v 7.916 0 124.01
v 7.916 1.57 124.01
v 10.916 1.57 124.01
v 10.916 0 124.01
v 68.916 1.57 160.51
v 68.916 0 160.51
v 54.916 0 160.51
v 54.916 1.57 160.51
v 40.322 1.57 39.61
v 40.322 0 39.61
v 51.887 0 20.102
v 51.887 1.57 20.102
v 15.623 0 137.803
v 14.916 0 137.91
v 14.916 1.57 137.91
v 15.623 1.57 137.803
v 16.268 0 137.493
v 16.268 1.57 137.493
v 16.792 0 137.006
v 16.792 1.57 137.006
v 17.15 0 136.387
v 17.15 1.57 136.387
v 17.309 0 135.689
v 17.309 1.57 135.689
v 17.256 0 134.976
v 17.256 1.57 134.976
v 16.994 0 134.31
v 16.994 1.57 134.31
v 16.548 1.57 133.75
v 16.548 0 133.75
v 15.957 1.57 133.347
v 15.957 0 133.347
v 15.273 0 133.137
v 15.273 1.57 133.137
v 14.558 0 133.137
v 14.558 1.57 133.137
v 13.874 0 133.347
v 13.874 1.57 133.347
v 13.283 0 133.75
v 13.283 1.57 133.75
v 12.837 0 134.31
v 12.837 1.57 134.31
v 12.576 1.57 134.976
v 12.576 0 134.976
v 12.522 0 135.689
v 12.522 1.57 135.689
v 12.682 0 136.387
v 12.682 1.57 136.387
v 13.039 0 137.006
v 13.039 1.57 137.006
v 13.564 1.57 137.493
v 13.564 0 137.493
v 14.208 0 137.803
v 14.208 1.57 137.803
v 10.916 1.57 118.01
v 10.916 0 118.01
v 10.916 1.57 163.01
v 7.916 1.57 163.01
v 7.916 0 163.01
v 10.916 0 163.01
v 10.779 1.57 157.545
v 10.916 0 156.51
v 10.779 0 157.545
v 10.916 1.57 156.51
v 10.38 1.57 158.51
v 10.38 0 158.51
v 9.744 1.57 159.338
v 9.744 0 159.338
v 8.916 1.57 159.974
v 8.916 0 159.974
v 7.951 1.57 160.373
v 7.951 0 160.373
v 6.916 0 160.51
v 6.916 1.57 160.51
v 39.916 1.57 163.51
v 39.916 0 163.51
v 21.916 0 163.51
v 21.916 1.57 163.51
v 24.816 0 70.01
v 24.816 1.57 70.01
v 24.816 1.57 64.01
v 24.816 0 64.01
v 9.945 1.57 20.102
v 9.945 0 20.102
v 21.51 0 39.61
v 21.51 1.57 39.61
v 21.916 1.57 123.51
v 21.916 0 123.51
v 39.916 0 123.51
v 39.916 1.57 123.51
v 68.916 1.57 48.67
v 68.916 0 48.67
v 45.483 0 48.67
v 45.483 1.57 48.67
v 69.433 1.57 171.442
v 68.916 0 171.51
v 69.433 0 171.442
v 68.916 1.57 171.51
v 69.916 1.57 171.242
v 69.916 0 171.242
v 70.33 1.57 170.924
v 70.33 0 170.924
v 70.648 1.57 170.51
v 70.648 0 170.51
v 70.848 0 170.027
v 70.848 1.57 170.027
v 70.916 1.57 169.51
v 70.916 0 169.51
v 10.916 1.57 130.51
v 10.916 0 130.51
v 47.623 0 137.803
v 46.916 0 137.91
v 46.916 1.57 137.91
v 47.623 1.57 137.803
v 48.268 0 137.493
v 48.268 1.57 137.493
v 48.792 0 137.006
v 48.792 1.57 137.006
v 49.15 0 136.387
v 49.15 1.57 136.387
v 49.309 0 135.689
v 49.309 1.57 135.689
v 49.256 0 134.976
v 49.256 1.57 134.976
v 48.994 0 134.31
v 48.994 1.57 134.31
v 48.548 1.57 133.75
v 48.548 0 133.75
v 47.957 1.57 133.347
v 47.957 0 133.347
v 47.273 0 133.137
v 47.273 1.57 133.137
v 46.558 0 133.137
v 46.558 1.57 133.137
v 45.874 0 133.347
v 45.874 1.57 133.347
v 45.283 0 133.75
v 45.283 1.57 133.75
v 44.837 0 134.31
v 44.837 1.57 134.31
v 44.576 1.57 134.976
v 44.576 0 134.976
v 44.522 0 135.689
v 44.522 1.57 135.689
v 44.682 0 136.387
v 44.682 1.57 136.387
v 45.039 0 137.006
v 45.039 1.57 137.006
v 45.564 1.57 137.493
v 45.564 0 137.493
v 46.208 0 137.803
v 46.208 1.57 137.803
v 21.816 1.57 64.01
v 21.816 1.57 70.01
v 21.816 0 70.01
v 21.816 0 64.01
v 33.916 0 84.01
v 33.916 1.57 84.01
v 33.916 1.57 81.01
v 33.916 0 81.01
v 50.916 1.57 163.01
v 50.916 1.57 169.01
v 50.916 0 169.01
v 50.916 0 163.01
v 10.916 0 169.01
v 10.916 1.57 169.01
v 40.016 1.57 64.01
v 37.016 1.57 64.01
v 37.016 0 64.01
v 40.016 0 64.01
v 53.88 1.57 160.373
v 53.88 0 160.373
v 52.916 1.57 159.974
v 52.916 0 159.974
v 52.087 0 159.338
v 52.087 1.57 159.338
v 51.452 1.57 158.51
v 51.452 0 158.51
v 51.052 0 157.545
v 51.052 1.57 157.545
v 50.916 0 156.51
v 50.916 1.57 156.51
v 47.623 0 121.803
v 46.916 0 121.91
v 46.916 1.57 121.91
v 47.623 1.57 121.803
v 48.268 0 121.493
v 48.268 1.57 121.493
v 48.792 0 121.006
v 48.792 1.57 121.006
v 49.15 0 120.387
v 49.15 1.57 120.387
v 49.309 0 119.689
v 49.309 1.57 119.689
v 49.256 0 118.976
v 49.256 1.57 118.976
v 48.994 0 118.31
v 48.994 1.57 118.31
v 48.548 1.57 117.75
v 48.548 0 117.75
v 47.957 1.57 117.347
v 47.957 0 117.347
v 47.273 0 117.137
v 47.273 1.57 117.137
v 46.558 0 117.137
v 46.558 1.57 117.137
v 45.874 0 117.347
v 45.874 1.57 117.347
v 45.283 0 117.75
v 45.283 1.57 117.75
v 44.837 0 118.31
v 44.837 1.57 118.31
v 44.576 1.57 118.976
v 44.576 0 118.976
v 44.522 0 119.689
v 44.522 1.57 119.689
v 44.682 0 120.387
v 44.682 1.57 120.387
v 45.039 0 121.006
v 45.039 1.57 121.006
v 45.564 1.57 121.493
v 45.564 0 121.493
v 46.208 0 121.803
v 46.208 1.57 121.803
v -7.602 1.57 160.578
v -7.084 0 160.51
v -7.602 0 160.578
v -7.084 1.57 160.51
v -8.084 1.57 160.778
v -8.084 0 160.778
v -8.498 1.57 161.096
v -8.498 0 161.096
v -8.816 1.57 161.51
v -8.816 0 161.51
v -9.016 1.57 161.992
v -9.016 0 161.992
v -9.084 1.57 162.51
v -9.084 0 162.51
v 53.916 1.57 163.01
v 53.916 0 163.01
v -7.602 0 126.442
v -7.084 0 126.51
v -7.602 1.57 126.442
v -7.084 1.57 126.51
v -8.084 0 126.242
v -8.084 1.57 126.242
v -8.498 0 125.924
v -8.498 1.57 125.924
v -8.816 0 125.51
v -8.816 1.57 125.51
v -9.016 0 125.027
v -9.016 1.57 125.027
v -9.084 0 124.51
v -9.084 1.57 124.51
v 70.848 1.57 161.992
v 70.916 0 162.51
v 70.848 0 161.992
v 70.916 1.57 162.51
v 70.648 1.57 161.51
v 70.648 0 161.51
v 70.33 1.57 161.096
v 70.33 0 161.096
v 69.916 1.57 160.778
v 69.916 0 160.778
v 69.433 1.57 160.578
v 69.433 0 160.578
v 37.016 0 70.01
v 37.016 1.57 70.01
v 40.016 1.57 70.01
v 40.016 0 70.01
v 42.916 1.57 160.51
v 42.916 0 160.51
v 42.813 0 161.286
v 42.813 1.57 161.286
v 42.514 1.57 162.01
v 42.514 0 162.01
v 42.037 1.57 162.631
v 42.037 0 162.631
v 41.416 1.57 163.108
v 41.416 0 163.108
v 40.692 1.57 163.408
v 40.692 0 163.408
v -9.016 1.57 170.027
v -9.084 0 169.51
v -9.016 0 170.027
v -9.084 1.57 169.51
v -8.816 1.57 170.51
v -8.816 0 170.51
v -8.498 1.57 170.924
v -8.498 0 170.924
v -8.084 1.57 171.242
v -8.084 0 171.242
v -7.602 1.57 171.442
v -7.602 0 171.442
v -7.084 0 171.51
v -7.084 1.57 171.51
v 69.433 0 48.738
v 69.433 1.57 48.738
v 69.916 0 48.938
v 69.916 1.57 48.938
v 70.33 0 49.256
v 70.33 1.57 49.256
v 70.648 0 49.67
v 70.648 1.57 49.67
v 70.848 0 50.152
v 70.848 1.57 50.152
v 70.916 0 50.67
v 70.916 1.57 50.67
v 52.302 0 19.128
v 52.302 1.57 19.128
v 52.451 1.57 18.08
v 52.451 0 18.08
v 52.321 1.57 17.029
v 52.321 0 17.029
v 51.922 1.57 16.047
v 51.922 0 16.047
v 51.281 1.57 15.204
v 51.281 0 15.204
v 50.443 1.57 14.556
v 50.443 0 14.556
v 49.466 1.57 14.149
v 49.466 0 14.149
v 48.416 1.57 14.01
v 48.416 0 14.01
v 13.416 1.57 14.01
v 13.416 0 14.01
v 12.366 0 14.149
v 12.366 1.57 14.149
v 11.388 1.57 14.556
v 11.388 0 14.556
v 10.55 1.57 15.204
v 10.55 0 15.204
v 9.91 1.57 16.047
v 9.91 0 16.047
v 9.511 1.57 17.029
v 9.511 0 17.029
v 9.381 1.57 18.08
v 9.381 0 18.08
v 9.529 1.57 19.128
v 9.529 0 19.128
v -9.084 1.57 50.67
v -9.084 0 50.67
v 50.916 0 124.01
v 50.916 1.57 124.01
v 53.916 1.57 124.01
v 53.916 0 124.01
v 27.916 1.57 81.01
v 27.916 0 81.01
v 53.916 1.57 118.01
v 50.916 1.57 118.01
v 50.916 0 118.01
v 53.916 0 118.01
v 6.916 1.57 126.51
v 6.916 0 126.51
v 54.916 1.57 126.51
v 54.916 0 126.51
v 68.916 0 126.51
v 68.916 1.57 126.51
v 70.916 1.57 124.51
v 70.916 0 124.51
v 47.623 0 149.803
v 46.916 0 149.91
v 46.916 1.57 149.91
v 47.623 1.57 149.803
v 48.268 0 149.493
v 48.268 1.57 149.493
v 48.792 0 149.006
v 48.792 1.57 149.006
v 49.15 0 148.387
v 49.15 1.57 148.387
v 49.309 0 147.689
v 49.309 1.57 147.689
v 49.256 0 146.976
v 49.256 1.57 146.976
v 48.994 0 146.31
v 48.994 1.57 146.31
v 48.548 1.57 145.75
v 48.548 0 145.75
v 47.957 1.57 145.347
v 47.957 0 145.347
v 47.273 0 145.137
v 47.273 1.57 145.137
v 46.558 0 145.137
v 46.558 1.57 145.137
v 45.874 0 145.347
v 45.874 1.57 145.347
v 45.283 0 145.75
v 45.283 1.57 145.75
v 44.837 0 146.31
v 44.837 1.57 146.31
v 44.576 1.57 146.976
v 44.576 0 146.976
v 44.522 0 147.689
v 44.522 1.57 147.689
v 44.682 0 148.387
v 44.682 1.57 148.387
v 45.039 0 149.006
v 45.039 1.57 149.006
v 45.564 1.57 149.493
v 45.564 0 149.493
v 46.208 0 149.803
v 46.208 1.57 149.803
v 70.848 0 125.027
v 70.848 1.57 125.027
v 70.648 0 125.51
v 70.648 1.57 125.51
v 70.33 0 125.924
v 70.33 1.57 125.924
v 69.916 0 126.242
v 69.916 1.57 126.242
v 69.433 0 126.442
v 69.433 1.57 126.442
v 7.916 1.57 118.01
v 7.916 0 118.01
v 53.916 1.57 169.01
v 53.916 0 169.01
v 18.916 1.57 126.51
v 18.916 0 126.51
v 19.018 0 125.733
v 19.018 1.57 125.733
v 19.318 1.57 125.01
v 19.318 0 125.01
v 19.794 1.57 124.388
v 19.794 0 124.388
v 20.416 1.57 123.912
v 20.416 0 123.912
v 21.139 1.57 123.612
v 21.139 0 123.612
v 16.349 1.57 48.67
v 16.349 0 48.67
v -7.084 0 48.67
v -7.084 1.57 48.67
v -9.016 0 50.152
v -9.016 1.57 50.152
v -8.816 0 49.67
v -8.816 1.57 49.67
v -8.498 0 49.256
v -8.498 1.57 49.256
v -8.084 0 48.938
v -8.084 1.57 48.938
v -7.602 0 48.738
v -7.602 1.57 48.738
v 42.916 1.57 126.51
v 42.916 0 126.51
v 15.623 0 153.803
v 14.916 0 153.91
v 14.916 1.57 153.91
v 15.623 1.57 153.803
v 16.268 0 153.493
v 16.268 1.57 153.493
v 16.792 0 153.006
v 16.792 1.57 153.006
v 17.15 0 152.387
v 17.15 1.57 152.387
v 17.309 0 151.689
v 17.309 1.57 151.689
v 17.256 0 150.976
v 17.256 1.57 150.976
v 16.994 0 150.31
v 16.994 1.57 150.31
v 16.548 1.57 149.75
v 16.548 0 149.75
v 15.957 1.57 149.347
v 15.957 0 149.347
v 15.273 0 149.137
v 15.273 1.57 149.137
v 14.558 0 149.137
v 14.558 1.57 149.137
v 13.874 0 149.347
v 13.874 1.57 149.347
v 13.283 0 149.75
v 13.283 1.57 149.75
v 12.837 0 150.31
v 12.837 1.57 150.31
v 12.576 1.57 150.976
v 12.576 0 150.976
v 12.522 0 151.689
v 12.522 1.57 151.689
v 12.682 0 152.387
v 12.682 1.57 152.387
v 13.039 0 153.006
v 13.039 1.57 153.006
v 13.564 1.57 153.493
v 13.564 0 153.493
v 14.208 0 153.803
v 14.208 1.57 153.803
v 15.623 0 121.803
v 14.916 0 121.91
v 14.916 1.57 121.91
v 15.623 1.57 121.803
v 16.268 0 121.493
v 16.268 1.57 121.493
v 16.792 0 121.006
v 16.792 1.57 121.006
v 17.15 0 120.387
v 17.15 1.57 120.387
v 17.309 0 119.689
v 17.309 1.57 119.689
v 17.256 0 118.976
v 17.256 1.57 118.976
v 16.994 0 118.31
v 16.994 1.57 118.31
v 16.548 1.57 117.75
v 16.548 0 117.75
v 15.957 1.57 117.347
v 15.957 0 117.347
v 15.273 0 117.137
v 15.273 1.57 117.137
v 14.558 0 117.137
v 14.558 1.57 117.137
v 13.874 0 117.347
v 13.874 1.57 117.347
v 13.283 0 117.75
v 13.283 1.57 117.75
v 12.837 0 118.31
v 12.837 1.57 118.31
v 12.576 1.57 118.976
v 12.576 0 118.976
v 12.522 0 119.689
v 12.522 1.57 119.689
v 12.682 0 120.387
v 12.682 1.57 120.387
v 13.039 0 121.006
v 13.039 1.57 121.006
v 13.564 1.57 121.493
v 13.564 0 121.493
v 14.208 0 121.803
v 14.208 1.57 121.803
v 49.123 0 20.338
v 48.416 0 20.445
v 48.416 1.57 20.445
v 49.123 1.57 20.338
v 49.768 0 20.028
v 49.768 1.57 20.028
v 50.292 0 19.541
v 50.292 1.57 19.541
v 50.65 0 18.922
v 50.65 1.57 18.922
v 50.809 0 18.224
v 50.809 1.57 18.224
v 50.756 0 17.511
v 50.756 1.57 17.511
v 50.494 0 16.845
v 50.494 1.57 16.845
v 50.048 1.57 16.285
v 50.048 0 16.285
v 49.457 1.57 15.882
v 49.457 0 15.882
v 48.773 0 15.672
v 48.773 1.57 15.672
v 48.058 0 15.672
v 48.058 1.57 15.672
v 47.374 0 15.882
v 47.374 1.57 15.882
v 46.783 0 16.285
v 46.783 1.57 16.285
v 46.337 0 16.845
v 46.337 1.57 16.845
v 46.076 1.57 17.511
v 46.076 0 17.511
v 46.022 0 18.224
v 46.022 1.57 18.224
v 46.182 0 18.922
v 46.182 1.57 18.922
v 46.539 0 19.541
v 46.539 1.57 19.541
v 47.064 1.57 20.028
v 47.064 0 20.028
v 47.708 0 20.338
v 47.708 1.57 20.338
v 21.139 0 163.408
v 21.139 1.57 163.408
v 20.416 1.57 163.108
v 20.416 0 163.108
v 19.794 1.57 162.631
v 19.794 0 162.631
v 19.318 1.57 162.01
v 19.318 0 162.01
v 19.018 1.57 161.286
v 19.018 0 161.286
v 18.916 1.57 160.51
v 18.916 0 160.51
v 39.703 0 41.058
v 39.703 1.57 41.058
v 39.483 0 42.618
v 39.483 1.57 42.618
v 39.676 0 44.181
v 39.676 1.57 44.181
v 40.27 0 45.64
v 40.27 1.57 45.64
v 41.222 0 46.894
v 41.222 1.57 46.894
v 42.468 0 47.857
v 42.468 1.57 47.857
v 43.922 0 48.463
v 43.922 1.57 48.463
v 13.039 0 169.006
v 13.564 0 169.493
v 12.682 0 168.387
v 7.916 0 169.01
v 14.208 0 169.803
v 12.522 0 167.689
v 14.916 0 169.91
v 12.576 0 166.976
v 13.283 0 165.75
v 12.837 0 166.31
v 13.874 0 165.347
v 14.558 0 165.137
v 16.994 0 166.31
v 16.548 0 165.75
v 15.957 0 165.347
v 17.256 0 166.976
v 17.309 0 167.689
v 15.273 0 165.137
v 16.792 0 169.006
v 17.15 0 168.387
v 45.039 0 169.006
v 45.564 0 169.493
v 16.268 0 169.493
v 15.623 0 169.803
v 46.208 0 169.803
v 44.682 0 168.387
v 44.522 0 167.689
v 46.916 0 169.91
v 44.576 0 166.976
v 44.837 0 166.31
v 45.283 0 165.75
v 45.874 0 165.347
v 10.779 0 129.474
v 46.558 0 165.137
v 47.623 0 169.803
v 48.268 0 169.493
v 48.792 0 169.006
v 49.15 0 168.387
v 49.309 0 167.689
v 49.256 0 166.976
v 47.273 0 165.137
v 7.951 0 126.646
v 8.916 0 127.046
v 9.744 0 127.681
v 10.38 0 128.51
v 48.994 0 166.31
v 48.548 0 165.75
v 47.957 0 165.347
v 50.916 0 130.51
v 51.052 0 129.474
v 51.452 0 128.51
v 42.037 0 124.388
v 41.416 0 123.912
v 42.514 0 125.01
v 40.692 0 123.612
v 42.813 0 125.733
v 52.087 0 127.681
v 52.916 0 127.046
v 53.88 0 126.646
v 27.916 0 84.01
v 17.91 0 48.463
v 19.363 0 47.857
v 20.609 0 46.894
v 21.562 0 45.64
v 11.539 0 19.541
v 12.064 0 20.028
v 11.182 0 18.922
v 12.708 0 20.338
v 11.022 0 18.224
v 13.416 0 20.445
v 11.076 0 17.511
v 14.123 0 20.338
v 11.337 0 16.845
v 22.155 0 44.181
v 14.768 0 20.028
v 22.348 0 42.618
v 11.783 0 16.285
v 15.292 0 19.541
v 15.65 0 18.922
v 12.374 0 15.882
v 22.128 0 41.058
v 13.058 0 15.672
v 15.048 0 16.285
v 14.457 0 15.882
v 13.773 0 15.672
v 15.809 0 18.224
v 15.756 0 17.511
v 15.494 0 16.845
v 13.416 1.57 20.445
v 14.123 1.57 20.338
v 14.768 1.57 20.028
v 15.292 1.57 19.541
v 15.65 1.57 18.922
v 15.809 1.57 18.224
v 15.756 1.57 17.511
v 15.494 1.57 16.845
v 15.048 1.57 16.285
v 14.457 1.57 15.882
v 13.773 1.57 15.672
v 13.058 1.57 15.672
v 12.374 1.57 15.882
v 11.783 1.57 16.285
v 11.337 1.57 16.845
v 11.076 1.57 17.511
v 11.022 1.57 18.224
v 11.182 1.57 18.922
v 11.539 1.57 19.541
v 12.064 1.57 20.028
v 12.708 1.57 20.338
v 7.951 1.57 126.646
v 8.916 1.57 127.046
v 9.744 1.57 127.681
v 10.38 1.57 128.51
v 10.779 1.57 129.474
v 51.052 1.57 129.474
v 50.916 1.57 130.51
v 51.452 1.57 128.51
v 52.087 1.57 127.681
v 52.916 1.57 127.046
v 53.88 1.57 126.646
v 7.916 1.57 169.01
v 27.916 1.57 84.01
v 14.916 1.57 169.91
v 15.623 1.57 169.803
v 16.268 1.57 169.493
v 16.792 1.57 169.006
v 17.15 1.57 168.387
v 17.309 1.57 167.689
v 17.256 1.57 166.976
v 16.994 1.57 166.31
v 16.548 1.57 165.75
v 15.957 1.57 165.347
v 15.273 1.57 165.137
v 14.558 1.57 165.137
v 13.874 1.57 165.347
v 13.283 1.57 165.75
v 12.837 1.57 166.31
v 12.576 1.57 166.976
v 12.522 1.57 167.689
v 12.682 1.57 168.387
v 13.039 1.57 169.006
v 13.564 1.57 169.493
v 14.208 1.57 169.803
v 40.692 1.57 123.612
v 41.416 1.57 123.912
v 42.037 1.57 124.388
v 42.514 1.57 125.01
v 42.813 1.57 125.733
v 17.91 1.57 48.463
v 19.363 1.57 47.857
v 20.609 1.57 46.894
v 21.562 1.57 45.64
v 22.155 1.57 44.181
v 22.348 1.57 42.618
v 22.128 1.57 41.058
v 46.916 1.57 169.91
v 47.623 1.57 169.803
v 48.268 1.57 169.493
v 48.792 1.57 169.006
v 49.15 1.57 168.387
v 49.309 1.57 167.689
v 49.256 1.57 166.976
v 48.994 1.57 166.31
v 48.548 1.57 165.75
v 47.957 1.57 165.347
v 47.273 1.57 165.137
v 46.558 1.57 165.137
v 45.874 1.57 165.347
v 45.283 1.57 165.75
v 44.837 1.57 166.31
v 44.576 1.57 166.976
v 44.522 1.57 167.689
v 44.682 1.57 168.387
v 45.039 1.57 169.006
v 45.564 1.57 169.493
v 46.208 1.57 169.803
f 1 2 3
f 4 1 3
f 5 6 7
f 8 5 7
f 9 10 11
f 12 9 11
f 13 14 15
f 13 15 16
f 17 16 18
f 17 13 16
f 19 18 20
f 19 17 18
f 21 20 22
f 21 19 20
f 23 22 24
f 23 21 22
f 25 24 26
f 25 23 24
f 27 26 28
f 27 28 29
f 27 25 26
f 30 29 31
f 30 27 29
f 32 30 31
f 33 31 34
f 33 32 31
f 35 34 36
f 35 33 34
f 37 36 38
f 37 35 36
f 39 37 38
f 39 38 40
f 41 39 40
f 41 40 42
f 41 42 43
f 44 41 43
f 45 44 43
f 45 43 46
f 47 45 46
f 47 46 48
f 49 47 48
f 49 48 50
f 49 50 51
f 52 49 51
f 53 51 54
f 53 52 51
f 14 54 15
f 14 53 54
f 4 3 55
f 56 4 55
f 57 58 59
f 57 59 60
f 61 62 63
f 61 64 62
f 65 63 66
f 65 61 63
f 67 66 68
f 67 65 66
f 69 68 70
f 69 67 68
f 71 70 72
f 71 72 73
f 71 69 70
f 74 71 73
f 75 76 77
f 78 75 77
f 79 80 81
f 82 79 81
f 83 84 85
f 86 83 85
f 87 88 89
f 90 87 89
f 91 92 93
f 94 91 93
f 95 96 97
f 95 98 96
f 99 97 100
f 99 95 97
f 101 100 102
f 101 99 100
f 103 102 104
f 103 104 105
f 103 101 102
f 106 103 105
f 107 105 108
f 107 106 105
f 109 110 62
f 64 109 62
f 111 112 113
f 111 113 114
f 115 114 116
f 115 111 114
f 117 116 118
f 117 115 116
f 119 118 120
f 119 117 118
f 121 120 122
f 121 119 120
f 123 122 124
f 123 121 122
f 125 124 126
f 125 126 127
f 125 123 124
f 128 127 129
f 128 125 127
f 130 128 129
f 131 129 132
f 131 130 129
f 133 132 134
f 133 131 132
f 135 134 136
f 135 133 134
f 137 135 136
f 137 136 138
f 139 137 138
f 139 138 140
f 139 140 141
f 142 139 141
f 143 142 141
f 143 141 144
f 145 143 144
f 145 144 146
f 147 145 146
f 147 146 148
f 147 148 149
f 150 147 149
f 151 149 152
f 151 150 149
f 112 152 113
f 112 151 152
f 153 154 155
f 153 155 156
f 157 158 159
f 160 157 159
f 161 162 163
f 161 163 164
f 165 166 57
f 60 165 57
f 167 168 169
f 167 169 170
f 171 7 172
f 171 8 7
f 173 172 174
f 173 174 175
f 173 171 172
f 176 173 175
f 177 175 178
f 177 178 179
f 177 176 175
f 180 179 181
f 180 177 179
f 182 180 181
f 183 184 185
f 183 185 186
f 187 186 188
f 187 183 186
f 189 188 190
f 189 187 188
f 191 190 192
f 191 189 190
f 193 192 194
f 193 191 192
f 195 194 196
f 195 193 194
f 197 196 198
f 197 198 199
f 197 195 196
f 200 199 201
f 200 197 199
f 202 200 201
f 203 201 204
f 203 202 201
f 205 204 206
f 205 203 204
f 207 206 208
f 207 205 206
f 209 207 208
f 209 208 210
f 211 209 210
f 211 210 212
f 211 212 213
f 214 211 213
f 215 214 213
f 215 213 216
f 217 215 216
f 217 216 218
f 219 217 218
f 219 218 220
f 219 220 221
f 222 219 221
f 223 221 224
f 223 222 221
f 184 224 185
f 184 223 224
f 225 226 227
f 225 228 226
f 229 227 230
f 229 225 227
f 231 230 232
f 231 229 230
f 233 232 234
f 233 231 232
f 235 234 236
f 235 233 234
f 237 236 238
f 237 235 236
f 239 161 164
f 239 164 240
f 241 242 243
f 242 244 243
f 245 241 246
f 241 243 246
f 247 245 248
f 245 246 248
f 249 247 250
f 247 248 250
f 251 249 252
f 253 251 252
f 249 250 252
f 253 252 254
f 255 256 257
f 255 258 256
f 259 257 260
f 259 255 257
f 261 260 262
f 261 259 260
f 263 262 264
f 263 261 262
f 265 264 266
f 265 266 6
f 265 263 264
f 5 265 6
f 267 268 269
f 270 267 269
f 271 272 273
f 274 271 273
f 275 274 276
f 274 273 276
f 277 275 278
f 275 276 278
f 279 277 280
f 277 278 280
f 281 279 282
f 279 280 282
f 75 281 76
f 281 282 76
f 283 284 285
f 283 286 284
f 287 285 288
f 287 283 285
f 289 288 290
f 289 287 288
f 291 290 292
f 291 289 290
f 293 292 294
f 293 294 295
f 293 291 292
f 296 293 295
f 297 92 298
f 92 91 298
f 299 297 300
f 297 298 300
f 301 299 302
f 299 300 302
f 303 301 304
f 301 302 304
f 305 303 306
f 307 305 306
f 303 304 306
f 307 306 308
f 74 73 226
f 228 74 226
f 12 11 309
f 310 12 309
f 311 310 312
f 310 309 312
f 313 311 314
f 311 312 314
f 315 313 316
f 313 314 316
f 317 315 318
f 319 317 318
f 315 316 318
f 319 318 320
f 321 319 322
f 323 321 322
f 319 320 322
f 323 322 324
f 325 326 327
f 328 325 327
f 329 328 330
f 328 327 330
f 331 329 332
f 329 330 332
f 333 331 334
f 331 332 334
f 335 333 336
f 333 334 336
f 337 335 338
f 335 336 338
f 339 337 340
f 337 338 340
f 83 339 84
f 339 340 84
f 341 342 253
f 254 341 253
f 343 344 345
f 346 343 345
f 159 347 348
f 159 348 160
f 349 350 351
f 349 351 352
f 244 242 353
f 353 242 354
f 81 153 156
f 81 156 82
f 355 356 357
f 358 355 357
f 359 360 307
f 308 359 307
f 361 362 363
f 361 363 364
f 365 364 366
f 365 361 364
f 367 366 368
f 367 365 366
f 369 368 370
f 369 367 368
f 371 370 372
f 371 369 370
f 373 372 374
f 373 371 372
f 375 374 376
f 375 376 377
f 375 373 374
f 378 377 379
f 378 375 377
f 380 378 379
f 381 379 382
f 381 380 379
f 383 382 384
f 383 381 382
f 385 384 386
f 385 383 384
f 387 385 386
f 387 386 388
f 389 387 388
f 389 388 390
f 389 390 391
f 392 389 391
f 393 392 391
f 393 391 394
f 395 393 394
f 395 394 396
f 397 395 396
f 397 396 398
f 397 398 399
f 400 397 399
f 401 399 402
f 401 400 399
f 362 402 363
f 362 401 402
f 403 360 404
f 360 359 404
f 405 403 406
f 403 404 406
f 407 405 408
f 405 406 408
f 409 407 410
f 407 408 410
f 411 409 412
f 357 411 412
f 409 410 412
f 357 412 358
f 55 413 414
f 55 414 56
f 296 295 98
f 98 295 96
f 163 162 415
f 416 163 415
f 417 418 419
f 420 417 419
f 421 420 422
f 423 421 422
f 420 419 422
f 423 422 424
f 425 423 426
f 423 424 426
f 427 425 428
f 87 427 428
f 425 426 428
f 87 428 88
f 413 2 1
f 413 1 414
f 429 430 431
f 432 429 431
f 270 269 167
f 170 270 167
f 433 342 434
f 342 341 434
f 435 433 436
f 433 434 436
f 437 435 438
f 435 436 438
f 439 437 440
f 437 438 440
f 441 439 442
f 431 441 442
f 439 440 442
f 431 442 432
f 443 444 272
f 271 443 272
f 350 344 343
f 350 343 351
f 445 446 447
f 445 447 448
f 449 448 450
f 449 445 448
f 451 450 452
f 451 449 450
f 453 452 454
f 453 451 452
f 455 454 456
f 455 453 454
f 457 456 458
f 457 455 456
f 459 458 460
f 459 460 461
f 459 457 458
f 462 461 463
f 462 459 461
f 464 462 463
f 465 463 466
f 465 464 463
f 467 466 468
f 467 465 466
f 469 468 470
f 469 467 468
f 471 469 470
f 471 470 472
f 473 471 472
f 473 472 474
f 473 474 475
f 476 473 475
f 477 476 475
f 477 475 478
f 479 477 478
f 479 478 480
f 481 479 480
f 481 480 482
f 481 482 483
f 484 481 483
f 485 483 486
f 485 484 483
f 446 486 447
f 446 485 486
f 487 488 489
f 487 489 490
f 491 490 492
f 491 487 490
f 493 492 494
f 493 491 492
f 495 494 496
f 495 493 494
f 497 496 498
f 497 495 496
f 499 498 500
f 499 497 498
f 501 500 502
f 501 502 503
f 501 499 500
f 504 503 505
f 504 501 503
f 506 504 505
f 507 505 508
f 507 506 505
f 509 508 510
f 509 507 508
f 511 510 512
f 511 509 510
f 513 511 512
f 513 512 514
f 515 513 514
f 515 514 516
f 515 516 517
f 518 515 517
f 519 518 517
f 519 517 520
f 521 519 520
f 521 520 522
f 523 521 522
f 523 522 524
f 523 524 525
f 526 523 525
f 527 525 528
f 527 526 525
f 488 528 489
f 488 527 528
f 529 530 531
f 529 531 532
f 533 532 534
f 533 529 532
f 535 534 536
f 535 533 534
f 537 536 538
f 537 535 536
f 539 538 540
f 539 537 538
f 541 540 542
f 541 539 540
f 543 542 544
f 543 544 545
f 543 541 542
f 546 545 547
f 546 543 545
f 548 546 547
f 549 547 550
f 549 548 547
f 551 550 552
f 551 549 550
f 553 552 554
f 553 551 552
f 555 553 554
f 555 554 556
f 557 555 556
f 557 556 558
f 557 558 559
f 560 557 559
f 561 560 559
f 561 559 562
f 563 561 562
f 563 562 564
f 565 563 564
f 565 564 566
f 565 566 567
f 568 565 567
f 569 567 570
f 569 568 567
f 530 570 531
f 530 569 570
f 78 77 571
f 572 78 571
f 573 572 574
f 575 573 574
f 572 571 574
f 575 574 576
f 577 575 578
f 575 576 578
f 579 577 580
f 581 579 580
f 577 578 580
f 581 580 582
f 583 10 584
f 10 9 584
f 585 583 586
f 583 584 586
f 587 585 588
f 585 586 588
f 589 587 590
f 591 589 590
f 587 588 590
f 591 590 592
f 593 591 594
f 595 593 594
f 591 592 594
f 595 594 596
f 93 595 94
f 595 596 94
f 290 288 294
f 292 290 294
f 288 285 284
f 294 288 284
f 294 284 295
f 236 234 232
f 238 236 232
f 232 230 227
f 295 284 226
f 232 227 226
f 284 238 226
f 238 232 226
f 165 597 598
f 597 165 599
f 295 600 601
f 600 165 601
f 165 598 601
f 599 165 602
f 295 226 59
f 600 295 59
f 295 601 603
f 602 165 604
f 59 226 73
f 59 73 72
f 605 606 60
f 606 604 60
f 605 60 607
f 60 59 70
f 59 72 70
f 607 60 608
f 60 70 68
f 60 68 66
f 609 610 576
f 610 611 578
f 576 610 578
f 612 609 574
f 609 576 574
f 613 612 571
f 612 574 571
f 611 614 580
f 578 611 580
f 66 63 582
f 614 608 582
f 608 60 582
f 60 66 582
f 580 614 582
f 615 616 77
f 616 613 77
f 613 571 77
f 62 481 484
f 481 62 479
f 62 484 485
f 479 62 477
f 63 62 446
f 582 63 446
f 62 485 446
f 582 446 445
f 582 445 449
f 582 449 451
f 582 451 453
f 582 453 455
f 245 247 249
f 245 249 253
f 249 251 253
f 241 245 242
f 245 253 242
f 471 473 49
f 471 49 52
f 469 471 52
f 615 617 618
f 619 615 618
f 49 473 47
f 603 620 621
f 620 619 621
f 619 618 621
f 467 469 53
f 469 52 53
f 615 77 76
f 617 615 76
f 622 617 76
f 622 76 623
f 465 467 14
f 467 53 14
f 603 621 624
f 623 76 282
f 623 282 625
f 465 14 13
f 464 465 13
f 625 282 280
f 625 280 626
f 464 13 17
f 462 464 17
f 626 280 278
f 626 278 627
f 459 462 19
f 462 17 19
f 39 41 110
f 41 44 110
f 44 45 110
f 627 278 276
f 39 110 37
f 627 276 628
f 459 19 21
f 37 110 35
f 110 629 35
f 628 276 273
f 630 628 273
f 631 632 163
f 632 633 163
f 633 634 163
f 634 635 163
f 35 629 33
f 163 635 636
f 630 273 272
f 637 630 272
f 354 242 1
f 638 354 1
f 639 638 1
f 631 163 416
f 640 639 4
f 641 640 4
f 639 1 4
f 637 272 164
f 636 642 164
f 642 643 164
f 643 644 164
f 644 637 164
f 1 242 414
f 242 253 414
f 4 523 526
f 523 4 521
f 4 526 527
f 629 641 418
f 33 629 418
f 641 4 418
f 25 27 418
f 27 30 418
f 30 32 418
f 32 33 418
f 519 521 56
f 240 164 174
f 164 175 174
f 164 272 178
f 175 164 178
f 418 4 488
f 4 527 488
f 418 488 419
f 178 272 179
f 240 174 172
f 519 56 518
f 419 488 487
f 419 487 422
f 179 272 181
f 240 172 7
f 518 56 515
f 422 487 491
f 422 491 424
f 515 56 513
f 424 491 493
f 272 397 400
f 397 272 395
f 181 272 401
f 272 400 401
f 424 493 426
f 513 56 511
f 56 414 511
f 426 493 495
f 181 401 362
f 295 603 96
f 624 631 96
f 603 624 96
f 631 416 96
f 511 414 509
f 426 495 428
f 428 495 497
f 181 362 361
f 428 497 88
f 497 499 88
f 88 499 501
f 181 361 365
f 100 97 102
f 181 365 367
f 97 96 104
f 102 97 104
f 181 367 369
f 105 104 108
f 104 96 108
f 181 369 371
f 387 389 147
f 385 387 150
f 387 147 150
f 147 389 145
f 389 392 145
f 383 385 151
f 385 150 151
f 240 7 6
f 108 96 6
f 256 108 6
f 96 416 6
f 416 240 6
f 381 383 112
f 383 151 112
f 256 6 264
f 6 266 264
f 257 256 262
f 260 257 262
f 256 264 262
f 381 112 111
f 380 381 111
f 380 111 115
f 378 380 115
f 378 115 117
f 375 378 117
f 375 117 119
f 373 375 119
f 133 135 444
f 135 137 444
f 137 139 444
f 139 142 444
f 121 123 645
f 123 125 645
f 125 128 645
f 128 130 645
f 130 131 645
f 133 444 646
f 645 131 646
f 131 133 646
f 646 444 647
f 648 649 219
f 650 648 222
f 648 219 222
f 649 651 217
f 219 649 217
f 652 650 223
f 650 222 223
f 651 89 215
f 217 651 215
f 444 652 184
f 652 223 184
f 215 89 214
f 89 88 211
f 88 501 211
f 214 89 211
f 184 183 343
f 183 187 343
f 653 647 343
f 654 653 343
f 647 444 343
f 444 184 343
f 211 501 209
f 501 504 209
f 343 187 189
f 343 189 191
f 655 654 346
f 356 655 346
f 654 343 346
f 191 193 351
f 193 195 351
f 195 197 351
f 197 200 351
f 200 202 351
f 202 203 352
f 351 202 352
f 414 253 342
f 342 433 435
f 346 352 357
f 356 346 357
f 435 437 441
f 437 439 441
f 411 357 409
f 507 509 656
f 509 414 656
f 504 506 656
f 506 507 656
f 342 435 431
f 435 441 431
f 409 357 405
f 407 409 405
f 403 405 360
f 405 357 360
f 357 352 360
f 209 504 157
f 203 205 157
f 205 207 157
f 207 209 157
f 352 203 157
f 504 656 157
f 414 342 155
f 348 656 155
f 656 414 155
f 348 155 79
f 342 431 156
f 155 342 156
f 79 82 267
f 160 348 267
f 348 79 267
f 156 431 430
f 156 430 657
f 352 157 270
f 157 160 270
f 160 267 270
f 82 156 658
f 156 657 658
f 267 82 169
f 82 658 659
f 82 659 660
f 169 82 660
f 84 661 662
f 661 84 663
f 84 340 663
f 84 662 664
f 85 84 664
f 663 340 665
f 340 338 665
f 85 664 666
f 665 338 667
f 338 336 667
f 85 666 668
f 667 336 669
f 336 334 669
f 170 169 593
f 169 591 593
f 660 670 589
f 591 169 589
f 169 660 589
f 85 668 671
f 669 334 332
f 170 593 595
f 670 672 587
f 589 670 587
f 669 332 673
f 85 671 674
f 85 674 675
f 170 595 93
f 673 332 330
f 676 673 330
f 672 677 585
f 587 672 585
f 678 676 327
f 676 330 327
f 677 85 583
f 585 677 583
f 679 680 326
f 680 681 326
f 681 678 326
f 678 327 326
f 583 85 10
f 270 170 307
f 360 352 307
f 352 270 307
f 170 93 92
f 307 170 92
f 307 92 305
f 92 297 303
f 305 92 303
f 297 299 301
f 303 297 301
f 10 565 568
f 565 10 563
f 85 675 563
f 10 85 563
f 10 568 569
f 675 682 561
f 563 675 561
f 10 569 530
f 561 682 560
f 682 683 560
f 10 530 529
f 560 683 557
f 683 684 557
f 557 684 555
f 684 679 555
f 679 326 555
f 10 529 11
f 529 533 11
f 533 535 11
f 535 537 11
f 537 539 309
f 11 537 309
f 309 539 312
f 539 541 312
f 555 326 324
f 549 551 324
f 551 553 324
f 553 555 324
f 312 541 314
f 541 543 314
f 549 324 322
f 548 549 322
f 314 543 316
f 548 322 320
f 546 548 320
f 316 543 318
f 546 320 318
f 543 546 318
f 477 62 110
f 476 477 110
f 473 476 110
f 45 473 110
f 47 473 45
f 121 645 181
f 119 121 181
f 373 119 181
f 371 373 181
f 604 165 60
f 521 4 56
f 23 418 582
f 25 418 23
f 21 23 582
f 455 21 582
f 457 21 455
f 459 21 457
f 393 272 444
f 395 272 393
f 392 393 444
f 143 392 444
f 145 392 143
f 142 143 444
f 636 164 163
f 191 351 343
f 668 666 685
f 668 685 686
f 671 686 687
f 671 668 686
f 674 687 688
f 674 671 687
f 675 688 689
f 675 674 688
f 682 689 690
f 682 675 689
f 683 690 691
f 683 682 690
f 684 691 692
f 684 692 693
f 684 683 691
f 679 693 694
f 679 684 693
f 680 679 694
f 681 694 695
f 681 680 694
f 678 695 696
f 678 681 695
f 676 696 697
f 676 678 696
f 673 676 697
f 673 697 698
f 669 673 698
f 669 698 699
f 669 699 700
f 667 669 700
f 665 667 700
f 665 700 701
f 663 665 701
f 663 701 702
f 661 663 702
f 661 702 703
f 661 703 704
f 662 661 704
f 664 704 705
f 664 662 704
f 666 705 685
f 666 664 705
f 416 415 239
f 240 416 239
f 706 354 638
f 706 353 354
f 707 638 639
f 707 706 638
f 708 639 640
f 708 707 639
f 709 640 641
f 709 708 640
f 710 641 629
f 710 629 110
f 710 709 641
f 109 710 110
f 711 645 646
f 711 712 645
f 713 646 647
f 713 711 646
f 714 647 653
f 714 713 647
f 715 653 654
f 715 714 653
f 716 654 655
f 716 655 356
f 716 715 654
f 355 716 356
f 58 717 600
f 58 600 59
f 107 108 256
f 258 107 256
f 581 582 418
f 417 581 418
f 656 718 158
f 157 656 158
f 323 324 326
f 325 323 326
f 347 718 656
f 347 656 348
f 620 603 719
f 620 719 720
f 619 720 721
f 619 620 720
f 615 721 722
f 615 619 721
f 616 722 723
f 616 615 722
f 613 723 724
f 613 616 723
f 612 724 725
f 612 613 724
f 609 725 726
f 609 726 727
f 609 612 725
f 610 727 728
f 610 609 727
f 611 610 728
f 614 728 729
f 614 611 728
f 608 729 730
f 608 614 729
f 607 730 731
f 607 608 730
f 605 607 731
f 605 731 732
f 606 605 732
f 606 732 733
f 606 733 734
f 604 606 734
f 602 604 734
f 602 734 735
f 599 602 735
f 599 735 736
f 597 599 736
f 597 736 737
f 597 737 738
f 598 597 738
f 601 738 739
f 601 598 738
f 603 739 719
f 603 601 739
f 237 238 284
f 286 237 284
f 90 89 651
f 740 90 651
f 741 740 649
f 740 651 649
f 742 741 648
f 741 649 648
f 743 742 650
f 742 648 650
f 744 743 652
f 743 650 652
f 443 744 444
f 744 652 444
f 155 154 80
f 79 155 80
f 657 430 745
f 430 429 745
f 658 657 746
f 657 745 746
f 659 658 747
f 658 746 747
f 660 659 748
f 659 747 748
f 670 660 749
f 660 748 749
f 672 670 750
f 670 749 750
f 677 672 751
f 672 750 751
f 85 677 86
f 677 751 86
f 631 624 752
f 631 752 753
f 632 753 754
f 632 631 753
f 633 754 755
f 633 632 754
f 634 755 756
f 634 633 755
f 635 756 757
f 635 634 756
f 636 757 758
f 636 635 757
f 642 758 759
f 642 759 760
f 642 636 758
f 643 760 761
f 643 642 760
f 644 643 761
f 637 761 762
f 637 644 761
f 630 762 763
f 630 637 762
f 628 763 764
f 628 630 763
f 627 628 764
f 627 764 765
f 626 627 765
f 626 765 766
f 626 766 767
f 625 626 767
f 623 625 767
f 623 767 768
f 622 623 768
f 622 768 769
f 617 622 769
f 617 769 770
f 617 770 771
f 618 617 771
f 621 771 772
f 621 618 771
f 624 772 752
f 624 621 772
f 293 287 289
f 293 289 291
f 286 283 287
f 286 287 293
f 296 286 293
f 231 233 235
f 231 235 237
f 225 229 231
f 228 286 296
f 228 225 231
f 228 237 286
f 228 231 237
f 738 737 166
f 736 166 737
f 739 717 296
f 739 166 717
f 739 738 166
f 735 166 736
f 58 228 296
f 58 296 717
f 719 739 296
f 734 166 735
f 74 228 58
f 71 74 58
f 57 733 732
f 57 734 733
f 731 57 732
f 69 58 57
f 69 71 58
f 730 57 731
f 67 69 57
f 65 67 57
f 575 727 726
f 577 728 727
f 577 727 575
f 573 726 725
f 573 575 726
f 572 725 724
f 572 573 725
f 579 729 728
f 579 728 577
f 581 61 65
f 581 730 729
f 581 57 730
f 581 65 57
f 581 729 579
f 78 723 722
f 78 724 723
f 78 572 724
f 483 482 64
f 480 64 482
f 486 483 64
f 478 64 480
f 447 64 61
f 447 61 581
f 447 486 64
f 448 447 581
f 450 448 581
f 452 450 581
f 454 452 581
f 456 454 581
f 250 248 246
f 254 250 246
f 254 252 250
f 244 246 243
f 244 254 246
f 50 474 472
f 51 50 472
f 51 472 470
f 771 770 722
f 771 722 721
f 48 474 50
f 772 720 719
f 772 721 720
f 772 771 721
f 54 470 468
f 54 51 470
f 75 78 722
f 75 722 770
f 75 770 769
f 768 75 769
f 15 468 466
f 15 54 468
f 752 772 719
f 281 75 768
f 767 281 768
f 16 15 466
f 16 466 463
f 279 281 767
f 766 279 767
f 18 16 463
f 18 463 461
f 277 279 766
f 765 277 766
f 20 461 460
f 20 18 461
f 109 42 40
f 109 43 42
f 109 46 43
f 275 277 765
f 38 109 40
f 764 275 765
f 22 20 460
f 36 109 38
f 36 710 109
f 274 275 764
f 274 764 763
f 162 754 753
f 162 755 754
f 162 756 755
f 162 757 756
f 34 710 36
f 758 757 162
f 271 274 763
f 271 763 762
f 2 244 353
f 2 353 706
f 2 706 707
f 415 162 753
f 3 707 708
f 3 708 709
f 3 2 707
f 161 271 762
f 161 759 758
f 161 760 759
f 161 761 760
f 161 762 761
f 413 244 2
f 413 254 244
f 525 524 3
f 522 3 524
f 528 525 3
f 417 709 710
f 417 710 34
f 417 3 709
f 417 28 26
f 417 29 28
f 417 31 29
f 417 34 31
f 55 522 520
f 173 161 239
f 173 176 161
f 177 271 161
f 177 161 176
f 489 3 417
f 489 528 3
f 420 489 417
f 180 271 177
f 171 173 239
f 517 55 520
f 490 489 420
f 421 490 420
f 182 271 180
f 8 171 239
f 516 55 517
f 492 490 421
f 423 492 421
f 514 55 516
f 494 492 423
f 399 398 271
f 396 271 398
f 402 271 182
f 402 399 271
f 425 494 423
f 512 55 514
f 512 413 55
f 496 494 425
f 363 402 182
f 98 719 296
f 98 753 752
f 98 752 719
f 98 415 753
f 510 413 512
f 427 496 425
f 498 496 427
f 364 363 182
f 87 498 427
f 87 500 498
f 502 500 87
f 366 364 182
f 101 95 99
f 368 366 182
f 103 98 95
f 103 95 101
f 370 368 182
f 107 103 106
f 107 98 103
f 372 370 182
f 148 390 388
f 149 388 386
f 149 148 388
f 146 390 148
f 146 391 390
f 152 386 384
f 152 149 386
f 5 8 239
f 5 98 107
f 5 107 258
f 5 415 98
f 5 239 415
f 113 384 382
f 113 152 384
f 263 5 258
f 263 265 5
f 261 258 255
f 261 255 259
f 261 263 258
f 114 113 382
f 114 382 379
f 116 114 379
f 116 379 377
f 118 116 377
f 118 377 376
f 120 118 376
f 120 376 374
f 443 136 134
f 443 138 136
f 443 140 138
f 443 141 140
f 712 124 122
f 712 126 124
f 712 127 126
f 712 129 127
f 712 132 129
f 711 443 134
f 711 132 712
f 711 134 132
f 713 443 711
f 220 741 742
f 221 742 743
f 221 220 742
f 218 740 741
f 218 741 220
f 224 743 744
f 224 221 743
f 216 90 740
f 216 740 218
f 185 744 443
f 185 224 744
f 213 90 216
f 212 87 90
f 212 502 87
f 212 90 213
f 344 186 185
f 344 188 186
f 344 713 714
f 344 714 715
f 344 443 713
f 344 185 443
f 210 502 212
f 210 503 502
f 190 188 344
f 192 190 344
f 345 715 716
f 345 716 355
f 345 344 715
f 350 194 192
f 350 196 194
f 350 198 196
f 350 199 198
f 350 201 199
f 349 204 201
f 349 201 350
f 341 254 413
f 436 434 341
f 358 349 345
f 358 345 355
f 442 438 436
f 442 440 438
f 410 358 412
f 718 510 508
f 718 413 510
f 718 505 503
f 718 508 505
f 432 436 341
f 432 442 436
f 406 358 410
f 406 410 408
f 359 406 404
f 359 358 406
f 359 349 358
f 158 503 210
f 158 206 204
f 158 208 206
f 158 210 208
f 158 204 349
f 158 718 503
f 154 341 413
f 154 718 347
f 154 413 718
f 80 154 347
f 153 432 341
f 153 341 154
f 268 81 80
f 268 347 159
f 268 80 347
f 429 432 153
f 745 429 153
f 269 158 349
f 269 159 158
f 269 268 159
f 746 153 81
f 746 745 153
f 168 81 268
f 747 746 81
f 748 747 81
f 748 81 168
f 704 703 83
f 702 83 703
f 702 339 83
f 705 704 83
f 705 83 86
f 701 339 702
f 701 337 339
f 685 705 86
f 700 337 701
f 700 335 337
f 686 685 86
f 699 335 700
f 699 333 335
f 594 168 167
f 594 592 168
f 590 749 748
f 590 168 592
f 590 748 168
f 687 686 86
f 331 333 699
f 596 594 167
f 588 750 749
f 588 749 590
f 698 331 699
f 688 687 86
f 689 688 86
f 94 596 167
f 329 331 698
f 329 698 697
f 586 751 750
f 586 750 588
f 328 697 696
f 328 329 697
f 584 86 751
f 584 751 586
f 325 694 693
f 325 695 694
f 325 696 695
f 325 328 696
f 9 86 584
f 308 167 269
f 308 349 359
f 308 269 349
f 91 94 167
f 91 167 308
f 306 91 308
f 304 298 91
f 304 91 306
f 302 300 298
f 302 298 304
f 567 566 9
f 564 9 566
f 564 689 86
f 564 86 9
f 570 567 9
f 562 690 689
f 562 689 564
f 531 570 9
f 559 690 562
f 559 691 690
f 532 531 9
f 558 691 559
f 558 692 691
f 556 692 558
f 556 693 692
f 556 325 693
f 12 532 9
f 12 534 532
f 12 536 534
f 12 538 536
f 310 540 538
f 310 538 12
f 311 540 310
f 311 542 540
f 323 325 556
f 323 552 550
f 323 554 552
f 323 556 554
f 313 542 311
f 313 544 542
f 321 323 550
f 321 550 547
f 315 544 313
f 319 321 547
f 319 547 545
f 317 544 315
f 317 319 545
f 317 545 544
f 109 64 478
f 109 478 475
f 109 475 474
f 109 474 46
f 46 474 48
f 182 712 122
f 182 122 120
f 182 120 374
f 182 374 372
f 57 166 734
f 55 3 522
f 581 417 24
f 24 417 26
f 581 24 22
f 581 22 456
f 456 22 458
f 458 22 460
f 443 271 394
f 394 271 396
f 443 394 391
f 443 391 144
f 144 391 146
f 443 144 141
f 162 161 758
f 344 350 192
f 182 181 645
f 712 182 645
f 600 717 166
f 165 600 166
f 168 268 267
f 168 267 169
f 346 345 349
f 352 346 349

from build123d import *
from OCP.BRepFilletAPI import BRepFilletAPI_MakeFillet

# Parameters (mm, degrees)
SKETCH2_R           = 2.4
BOSS_EXTRUDE1_DEPTH = 1.57
FILLET1_R1          = 4
FILLET1_R2          = 6
FILLET2_R           = 2
SKETCH3_W           = 3
SKETCH3_H           = 6
SKETCH3_W_2         = 6
SKETCH3_H_2         = 3
CUT_EXTRUDE1_DEPTH  = 10


with BuildPart() as part:
    # Sketch2 → Boss-Extrude1 (new body)
    with BuildSketch(Plane(origin=(0, 0, 0), x_dir=(1, 0, 0), z_dir=(0, 1, 0))):
        with BuildLine():
            Line((70.915716682, -126.509753408), (70.915716682, -48.669731747))
            Line((70.915716682, -48.669731747), (34.950716682, -48.669731747))
            Line((34.950716682, -48.669731747), (51.886612754, -20.102447618))
            ThreePointArc((51.886612754, -20.102447618), (51.921713055, -16.04745162), (48.415716682, -14.009753408))
            Line((48.415716682, -14.009753408), (13.415716682, -14.009753408))
            ThreePointArc((13.415716682, -14.009753408), (9.909720309, -16.04745162), (9.944820611, -20.102447618))
            Line((9.944820611, -20.102447618), (26.880716682, -48.669731747))
            Line((26.880716682, -48.669731747), (-9.084283318, -48.669731747))
            Line((-9.084283318, -48.669731747), (-9.084283318, -126.509753408))
            Line((-9.084283318, -126.509753408), (10.915716682, -126.509753408))
            Line((10.915716682, -126.509753408), (10.915716682, -160.509753408))
            Line((10.915716682, -160.509753408), (-9.084283318, -160.509753408))
            Line((-9.084283318, -160.509753408), (-9.084283318, -171.509753408))
            Line((-9.084283318, -171.509753408), (70.915716682, -171.509753408))
            Line((70.915716682, -171.509753408), (70.915716682, -160.509753408))
            Line((70.915716682, -160.509753408), (50.915716682, -160.509753408))
            Line((50.915716682, -160.509753408), (50.915716682, -126.509753408))
            Line((50.915716682, -126.509753408), (70.915716682, -126.509753408))
        make_face()
        with BuildLine():
            Line((42.915716682, -126.509753408), (42.915716682, -160.509753408))
            ThreePointArc((42.915716682, -160.509753408), (42.037037026, -162.631073752), (39.915716682, -163.509753408))
            Line((39.915716682, -163.509753408), (21.915716682, -163.509753408))
            ThreePointArc((21.915716682, -163.509753408), (19.794396339, -162.631073752), (18.915716682, -160.509753408))
            Line((18.915716682, -160.509753408), (18.915716682, -126.509753408))
            ThreePointArc((18.915716682, -126.509753408), (19.794396339, -124.388433064), (21.915716682, -123.509753408))
            Line((21.915716682, -123.509753408), (39.915716682, -123.509753408))
            ThreePointArc((39.915716682, -123.509753408), (42.037037026, -124.388433064), (42.915716682, -126.509753408))
        make_face(mode=Mode.SUBTRACT)
        with Locations((46.915716682, -135.509753408)):
            Circle(SKETCH2_R, mode=Mode.SUBTRACT)
        with Locations((46.915716682, -119.509753408)):
            Circle(SKETCH2_R, mode=Mode.SUBTRACT)
        with Locations((14.915716682, -119.509753408)):
            Circle(SKETCH2_R, mode=Mode.SUBTRACT)
        with Locations((14.915716682, -135.509753408)):
            Circle(SKETCH2_R, mode=Mode.SUBTRACT)
        with Locations((46.915716682, -147.509753408)):
            Circle(SKETCH2_R, mode=Mode.SUBTRACT)
        with Locations((14.915716682, -151.509753408)):
            Circle(SKETCH2_R, mode=Mode.SUBTRACT)
        with Locations((48.415716682, -18.044753408)):
            Circle(SKETCH2_R, mode=Mode.SUBTRACT)
        with Locations((13.415716682, -18.044753408)):
            Circle(SKETCH2_R, mode=Mode.SUBTRACT)
        with Locations((14.915716682, -167.509753408)):
            Circle(SKETCH2_R, mode=Mode.SUBTRACT)
        with Locations((46.915716682, -167.509753408)):
            Circle(SKETCH2_R, mode=Mode.SUBTRACT)
    extrude(amount=BOSS_EXTRUDE1_DEPTH)

    # Fillet1: one fillet with a radius per group of edges: ONE call of the kernel's fillet builder (fillet() takes one radius for all edges)
    fillet1_edges_1 = [part.edges().sort_by_distance(p)[0] for p in [
        (50.915716682, 0.785, 126.509753408),
        (50.915716682, 0.785, 160.509753408),
        (10.915716682, 0.785, 126.509753408),
        (10.915716682, 0.785, 160.509753408),
    ]]
    fillet1_edges_2 = [part.edges().sort_by_distance(p)[0] for p in [
        (26.880716682, 0.785, 48.669731747),
        (34.950716682, 0.785, 48.669731747),
    ]]
    fillet1 = BRepFilletAPI_MakeFillet(part.part.solid().wrapped)
    for e in fillet1_edges_1:
        fillet1.Add(FILLET1_R1, e.wrapped)
    for e in fillet1_edges_2:
        fillet1.Add(FILLET1_R2, e.wrapped)
    add(Compound.cast(fillet1.Shape()), mode=Mode.REPLACE)

    # Fillet2
    fillet2_edges = [part.edges().sort_by_distance(p)[0] for p in [
        (-9.084283318, 0.785, 171.509753408),
        (-9.084283318, 0.785, 160.509753408),
        (-9.084283318, 0.785, 126.509753408),
        (-9.084283318, 0.785, 48.669731747),
        (70.915716682, 0.785, 48.669731747),
        (70.915716682, 0.785, 171.509753408),
        (70.915716682, 0.785, 160.509753408),
        (70.915716682, 0.785, 126.509753408),
    ]]
    fillet(fillet2_edges, radius=FILLET2_R)

    # Sketch3 → Cut-Extrude1 (cut)
    with BuildSketch(Plane(origin=(0, 1.57, 0), x_dir=(1, 0, 0), z_dir=(0, 1, 0))):
        with Locations((9.415716682, -166.009753408)):
            Rectangle(SKETCH3_W, SKETCH3_H)
        with Locations((52.415716682, -166.009753408)):
            Rectangle(SKETCH3_W, SKETCH3_H)
        with Locations((52.415716682, -121.009753408)):
            Rectangle(SKETCH3_W, SKETCH3_H)
        with Locations((9.415716682, -121.009753408)):
            Rectangle(SKETCH3_W, SKETCH3_H)
        with Locations((23.315716682, -67.009753408)):
            Rectangle(SKETCH3_W, SKETCH3_H)
        with Locations((38.515716682, -67.009753408)):
            Rectangle(SKETCH3_W, SKETCH3_H)
        with Locations((30.915716682, -82.509753408)):
            Rectangle(SKETCH3_W_2, SKETCH3_H_2)
    extrude(amount=-CUT_EXTRUDE1_DEPTH, mode=Mode.SUBTRACT)


solid = part.part
